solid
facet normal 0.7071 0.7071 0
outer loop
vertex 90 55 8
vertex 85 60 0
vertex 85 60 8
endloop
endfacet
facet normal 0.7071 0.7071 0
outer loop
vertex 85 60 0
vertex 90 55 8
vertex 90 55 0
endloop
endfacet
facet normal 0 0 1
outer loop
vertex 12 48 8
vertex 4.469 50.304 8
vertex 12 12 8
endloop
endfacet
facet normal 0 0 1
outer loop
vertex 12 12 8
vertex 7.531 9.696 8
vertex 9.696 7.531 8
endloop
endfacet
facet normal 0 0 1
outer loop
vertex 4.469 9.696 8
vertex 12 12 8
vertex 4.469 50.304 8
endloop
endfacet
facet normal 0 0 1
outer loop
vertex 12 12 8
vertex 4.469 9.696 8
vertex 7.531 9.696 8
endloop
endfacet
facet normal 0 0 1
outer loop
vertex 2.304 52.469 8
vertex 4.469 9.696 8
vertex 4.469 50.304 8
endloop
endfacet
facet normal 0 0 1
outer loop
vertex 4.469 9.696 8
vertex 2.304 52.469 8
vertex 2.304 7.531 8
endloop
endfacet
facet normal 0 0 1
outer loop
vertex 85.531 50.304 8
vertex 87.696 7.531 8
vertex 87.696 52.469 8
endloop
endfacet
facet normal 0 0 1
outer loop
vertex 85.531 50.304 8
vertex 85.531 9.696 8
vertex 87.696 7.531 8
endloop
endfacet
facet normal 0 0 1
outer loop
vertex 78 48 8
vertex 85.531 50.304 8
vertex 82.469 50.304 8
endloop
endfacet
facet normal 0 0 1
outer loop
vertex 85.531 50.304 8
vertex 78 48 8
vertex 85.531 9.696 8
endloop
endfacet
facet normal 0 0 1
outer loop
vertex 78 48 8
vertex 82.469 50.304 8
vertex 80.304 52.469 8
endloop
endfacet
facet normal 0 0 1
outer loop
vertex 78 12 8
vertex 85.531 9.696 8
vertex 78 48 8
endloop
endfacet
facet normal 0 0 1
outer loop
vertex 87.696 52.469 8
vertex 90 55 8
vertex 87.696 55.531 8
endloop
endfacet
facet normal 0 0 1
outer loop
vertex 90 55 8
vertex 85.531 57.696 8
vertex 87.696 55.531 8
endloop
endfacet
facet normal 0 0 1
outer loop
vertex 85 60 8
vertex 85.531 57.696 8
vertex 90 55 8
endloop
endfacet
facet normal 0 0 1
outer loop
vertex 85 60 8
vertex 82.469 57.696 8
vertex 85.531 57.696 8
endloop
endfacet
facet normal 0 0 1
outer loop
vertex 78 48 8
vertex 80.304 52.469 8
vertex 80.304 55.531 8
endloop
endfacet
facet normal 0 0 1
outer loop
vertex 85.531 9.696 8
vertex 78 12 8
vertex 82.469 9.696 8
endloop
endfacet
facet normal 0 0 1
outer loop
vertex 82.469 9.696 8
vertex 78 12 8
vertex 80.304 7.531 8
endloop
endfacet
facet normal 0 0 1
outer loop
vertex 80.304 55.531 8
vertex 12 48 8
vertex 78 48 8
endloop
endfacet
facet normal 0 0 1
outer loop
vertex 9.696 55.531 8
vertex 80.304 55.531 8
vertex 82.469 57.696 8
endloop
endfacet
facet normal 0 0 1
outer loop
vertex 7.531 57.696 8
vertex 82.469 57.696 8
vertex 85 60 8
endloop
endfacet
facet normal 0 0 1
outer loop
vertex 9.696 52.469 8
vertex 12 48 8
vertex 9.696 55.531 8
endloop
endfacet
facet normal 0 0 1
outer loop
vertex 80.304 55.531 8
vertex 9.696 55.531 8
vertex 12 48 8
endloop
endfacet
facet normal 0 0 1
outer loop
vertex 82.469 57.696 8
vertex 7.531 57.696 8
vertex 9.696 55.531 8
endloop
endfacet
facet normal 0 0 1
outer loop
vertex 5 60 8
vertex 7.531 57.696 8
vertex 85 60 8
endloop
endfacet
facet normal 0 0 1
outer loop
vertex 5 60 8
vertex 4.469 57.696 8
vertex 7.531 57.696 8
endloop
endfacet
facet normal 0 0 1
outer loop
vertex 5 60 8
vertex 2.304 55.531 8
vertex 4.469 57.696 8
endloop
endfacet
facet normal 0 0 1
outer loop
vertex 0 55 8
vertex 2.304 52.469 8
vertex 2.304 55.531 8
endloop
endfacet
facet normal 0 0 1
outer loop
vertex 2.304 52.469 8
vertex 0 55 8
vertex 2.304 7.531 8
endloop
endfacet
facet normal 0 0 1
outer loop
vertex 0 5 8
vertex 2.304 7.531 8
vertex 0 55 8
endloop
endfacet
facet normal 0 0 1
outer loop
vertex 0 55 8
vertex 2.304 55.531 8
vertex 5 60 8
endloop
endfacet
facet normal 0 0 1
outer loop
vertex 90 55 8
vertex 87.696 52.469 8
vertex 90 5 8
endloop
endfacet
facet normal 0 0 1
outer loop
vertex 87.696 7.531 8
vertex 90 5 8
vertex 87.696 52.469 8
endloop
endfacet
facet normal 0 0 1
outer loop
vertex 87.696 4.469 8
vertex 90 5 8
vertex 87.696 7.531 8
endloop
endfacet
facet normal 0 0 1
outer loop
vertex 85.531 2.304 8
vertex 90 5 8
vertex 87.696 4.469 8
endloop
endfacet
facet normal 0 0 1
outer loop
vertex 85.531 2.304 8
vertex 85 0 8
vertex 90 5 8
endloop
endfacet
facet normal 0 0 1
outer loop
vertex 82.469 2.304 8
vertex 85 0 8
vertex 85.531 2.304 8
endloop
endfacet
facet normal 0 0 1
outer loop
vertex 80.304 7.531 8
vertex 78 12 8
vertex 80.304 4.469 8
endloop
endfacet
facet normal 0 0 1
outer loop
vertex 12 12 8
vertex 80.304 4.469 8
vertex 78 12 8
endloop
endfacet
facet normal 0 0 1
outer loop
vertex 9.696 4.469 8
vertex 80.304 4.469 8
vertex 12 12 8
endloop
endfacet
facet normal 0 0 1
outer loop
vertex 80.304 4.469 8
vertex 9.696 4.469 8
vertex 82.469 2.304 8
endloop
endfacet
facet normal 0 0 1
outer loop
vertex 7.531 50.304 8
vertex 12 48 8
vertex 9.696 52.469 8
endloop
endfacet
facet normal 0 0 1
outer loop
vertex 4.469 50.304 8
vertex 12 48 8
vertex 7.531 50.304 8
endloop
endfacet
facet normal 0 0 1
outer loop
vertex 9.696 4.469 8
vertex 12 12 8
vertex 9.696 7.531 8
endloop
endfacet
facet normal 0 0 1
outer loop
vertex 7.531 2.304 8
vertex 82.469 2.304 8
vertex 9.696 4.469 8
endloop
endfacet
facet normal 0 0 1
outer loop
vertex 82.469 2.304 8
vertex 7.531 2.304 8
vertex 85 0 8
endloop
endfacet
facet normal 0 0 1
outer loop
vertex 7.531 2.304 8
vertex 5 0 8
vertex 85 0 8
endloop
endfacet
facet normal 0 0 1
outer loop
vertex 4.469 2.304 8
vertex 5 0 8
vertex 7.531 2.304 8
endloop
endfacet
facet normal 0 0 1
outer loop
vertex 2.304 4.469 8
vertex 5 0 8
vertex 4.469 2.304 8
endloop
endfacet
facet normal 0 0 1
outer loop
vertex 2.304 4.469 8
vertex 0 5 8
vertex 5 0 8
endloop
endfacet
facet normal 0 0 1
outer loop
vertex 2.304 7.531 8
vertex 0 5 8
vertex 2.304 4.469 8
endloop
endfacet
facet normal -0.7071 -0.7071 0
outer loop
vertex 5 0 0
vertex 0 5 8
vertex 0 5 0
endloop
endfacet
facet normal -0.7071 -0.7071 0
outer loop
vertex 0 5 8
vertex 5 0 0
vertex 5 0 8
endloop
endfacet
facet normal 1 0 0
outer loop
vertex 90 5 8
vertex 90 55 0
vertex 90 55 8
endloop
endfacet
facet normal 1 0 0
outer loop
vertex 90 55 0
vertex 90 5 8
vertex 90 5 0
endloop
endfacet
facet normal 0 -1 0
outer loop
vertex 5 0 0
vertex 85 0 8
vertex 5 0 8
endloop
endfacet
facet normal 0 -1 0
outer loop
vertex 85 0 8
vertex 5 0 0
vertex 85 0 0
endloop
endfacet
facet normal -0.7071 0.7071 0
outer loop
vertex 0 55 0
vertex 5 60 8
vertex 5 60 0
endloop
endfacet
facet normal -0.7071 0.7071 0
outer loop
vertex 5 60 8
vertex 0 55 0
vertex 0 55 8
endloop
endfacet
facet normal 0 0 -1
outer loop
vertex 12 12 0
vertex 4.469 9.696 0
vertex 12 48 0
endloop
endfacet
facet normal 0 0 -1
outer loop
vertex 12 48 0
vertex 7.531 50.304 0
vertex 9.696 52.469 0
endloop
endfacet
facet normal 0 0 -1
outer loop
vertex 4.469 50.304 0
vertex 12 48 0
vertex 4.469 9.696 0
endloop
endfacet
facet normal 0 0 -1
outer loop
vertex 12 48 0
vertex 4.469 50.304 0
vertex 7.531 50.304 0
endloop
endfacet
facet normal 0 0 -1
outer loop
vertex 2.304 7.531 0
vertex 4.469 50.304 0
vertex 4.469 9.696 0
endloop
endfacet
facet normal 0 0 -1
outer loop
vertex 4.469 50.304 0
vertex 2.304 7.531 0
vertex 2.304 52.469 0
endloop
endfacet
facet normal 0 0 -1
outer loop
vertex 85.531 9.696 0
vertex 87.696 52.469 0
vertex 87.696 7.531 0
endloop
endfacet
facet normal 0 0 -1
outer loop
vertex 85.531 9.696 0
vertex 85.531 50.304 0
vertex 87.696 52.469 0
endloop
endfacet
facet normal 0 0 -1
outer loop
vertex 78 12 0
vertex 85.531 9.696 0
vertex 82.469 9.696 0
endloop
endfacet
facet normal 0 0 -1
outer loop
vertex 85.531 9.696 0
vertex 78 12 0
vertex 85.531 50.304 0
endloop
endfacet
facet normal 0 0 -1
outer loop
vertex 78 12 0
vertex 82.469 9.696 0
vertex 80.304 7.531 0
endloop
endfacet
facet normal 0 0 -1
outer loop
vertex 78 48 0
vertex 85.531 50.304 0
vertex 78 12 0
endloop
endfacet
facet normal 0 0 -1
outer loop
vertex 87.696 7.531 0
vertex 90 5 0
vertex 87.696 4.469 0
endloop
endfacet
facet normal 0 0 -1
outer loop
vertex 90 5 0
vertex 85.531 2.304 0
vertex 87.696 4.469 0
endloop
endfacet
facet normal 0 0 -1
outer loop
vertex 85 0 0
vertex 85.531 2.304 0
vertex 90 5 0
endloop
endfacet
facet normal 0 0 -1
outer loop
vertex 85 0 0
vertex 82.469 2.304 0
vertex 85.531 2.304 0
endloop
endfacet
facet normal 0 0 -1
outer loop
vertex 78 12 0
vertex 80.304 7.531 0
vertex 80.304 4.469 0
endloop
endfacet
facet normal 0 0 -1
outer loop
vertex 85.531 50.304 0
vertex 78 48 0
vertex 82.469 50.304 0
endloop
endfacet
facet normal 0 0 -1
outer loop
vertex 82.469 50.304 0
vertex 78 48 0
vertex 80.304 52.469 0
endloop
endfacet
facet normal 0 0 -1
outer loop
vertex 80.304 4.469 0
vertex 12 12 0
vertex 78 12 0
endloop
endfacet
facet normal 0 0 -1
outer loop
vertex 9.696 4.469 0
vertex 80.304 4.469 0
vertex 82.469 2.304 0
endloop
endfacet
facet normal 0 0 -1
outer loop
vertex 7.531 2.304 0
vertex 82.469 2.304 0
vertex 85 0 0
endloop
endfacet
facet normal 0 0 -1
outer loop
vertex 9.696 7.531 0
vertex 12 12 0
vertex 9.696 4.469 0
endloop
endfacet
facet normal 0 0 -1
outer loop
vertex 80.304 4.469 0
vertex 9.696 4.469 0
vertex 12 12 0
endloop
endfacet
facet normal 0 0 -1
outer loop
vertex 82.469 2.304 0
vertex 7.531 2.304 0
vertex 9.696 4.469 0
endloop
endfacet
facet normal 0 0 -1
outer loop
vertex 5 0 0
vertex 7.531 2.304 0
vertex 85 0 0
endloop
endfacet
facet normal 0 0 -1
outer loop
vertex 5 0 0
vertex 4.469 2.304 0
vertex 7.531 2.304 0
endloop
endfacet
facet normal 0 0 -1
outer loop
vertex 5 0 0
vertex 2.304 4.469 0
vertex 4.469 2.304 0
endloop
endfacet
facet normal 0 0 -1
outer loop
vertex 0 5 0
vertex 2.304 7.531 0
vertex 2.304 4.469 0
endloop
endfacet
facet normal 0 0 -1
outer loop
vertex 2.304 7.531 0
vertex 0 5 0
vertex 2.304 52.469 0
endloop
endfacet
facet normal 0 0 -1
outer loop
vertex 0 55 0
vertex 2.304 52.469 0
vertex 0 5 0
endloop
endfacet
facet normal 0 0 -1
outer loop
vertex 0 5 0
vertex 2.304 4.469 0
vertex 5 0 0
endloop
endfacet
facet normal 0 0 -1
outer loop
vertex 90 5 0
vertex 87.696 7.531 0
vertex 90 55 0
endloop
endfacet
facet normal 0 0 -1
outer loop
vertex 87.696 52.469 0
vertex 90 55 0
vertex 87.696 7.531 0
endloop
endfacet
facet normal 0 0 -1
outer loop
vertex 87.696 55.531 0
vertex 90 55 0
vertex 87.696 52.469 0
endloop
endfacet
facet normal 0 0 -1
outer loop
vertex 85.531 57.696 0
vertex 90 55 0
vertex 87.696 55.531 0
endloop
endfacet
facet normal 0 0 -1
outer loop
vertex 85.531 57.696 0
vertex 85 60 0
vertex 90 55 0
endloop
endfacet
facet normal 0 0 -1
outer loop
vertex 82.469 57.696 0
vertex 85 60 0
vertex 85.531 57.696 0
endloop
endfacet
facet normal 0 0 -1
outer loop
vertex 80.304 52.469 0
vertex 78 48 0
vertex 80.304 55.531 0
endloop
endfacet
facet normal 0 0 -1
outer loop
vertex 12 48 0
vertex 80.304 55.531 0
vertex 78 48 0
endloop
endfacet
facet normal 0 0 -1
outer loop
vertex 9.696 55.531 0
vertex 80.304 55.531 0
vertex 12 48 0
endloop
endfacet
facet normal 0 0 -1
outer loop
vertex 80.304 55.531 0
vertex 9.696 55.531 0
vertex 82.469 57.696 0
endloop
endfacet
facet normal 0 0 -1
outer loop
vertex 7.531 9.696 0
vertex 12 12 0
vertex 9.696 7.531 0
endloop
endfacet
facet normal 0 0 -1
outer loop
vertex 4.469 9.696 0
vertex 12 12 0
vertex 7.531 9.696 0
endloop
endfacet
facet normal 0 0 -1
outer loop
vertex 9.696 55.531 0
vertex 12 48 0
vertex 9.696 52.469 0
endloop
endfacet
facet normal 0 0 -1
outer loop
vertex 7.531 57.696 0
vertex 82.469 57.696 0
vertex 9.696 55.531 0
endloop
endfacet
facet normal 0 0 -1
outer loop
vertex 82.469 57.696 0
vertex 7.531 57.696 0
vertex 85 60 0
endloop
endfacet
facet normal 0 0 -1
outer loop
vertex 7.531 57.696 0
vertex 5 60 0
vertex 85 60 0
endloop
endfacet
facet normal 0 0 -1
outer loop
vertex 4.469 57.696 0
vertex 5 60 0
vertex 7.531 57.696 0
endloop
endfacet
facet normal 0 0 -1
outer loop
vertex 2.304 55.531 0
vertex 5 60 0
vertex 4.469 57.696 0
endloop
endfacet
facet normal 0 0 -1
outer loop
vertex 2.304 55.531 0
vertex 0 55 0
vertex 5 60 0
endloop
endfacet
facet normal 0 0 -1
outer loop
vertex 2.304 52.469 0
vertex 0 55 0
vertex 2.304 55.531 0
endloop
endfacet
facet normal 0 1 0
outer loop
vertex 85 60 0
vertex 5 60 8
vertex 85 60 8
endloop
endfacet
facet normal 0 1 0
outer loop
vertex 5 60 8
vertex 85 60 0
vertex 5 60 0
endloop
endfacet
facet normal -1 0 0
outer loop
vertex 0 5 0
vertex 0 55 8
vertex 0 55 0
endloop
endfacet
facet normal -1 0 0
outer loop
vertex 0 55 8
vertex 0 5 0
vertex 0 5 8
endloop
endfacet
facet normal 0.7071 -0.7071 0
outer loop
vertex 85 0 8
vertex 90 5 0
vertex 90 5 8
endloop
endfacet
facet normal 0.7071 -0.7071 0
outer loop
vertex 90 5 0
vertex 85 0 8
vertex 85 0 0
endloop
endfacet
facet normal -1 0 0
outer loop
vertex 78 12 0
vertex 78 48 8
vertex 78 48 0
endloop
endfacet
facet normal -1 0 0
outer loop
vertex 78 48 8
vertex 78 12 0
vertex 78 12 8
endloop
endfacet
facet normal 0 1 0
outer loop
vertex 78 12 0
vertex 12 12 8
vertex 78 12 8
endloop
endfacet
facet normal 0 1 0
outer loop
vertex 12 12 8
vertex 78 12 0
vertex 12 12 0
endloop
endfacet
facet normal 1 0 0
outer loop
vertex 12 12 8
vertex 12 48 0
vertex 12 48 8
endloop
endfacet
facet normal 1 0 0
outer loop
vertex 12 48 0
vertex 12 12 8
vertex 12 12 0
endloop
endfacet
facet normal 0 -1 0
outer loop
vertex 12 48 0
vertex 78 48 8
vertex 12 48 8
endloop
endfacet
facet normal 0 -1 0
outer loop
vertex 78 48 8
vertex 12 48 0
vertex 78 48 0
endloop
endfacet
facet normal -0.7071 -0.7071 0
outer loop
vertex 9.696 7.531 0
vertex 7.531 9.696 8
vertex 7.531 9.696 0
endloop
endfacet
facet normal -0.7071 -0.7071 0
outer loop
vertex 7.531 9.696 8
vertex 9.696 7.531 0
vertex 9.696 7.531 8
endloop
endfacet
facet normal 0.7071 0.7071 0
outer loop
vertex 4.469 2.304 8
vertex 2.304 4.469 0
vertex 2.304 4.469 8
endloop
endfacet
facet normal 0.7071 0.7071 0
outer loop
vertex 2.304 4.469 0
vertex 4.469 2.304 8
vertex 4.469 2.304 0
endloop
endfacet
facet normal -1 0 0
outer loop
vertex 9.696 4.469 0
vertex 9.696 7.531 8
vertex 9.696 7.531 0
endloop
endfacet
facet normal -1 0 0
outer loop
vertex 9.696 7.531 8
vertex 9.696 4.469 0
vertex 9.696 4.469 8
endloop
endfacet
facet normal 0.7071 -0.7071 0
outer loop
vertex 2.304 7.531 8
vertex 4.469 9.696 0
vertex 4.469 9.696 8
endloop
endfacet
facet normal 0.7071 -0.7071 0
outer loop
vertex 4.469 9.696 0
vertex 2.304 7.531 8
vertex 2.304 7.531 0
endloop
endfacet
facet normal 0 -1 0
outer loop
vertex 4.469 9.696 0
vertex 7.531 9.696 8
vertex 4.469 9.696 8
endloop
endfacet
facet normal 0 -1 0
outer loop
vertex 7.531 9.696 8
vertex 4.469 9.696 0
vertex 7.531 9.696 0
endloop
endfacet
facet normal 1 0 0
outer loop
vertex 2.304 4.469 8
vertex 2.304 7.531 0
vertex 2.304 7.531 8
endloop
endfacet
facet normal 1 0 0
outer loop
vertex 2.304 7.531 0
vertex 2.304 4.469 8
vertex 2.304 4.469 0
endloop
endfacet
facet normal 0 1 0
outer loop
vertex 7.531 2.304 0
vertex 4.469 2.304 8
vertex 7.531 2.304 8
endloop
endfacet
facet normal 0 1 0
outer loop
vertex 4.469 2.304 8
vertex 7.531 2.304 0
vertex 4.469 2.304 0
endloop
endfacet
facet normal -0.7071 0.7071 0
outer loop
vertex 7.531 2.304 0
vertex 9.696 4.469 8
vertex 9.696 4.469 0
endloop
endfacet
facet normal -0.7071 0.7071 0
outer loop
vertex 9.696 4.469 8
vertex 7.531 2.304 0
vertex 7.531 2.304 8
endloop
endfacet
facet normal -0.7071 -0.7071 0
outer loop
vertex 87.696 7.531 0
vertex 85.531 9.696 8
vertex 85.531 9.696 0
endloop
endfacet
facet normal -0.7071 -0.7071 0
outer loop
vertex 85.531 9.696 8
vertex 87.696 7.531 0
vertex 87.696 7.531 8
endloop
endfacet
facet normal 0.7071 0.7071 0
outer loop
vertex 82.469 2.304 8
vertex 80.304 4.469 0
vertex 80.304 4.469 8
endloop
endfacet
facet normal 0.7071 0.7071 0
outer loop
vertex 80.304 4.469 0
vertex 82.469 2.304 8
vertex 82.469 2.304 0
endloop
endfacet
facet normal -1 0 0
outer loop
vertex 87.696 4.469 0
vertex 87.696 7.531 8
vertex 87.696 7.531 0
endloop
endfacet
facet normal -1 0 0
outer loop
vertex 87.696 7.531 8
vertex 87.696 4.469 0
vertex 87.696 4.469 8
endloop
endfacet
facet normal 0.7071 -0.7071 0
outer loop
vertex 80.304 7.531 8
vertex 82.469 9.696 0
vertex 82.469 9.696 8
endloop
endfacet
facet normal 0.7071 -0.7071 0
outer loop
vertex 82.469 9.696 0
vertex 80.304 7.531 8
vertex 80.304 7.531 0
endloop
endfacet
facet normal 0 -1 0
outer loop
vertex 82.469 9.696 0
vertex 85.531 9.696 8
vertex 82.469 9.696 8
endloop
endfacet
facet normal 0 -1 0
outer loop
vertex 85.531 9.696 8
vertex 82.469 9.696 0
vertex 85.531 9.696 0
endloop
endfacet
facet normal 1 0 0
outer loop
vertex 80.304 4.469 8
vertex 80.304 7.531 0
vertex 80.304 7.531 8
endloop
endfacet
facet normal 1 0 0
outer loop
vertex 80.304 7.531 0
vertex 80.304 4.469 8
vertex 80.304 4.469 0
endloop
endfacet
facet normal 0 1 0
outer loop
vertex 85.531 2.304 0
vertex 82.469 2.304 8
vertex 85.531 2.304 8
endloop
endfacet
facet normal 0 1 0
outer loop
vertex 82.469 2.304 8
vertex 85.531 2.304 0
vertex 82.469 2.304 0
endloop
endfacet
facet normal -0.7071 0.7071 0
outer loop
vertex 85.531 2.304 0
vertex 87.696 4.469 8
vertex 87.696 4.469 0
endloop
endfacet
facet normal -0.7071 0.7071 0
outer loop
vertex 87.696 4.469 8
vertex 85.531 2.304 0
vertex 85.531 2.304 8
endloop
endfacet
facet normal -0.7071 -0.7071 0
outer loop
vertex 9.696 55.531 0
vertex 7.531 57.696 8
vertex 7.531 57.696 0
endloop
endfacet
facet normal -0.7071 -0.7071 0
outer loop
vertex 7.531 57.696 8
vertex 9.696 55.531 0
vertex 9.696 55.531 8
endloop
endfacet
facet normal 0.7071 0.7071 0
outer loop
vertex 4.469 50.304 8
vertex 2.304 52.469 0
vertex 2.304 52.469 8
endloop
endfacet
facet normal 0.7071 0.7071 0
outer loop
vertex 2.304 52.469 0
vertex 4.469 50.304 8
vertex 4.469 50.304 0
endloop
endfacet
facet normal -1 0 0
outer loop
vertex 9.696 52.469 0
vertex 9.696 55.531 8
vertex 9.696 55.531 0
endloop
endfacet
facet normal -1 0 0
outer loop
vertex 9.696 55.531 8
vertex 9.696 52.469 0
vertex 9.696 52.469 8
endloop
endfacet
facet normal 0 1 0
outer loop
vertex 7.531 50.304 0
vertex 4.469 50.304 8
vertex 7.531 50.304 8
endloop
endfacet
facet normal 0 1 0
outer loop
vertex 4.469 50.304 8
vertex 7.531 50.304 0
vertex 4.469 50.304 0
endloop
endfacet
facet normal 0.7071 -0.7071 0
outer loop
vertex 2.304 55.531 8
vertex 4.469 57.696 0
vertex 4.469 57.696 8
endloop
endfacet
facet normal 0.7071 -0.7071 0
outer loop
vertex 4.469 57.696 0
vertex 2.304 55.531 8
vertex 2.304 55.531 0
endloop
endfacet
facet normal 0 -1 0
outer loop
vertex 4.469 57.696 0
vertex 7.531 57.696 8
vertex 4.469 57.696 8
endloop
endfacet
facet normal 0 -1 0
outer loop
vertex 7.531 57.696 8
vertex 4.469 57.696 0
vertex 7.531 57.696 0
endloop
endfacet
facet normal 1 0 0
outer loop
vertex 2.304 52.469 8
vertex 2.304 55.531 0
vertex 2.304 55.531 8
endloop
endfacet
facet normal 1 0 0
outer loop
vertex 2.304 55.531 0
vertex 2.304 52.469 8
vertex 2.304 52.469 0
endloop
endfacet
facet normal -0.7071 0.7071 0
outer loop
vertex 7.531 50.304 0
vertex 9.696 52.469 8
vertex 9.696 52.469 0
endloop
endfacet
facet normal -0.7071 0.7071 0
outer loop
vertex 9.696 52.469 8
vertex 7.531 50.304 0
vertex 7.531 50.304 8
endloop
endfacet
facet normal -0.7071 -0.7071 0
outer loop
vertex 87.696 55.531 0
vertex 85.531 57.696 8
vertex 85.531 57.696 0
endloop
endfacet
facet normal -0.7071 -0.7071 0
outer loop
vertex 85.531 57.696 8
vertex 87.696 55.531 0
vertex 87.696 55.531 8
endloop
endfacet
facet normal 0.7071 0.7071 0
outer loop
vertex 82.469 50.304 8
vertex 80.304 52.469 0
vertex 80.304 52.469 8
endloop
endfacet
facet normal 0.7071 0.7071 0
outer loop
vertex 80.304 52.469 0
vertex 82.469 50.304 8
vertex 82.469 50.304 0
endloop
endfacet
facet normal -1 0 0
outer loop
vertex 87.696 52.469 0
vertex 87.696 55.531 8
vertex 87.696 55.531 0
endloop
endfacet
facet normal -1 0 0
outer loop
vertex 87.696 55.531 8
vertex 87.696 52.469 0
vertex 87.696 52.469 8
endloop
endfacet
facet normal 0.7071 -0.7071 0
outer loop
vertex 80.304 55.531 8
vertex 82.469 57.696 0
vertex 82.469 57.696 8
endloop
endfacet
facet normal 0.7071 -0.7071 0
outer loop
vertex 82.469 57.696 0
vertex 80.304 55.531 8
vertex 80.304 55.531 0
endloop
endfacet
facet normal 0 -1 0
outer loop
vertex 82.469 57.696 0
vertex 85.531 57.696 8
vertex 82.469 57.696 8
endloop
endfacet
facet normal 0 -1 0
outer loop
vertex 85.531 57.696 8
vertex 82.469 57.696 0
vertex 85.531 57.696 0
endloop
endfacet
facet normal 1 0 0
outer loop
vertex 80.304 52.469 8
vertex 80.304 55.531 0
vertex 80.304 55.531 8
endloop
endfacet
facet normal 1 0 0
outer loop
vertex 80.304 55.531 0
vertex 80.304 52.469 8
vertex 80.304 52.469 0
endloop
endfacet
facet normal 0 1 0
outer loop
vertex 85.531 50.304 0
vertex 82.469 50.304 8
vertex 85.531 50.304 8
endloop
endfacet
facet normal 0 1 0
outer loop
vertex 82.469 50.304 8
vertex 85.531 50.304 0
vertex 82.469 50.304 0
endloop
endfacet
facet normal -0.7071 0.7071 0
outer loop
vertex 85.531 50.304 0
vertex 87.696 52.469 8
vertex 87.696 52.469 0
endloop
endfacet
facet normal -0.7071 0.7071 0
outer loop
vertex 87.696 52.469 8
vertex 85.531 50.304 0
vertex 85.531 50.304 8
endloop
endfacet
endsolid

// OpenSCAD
$fn = 32;

// ----------------------------------------------------------------------
// Frame plate: 90 x 60 frame, 12 mm rails
// ----------------------------------------------------------------------

// --- parameters (mm) ---
plate_l = 90;             // plate length, X
plate_w = 60;             // plate width, Y
plate_t = 8;              // plate thickness, Z (extrusion height)
corner_c = 5;             // corner chamfer
frame_bar = 12;           // frame rail width
bolt_r = 4;               // corner bolt window radius
bolt_inset = 6;           // bolt centre inset from the edges

win_l = plate_l - 2 * frame_bar;  // window length
win_w = plate_w - 2 * frame_bar;  // window width
bolt_d = 2 * bolt_r;  // corner hole diameter

profile = [[5, 0], [85, 0], [90, 5], [90, 55], [85, 60], [5, 60], [0, 55], [0, 5]];  // primary outline, 8 points, counter clockwise
void_1 = [[12, 12], [78, 12], [78, 48], [12, 48]];  // the window, 4 points
void_2 = [[9.696, 7.531], [7.531, 9.696], [4.469, 9.696], [2.304, 7.531], [2.304, 4.469], [4.469, 2.304], [7.531, 2.304], [9.696, 4.469]];  // corner bolt window, 8 points
void_3 = [[87.696, 7.531], [85.531, 9.696], [82.469, 9.696], [80.304, 7.531], [80.304, 4.469], [82.469, 2.304], [85.531, 2.304], [87.696, 4.469]];  // corner bolt window, 8 points
void_4 = [[9.696, 55.531], [7.531, 57.696], [4.469, 57.696], [2.304, 55.531], [2.304, 52.469], [4.469, 50.304], [7.531, 50.304], [9.696, 52.469]];  // corner bolt window, 8 points
void_5 = [[87.696, 55.531], [85.531, 57.696], [82.469, 57.696], [80.304, 55.531], [80.304, 52.469], [82.469, 50.304], [85.531, 50.304], [87.696, 52.469]];  // corner bolt window, 8 points

// --- the one profile operation ---
difference() {
  linear_extrude(height = plate_t) polygon(points = profile);
  translate([0, 0, -1])
    linear_extrude(height = plate_t + 2) polygon(points = void_1);
  translate([0, 0, -1])
    linear_extrude(height = plate_t + 2) polygon(points = void_2);
  translate([0, 0, -1])
    linear_extrude(height = plate_t + 2) polygon(points = void_3);
  translate([0, 0, -1])
    linear_extrude(height = plate_t + 2) polygon(points = void_4);
  translate([0, 0, -1])
    linear_extrude(height = plate_t + 2) polygon(points = void_5);
}
